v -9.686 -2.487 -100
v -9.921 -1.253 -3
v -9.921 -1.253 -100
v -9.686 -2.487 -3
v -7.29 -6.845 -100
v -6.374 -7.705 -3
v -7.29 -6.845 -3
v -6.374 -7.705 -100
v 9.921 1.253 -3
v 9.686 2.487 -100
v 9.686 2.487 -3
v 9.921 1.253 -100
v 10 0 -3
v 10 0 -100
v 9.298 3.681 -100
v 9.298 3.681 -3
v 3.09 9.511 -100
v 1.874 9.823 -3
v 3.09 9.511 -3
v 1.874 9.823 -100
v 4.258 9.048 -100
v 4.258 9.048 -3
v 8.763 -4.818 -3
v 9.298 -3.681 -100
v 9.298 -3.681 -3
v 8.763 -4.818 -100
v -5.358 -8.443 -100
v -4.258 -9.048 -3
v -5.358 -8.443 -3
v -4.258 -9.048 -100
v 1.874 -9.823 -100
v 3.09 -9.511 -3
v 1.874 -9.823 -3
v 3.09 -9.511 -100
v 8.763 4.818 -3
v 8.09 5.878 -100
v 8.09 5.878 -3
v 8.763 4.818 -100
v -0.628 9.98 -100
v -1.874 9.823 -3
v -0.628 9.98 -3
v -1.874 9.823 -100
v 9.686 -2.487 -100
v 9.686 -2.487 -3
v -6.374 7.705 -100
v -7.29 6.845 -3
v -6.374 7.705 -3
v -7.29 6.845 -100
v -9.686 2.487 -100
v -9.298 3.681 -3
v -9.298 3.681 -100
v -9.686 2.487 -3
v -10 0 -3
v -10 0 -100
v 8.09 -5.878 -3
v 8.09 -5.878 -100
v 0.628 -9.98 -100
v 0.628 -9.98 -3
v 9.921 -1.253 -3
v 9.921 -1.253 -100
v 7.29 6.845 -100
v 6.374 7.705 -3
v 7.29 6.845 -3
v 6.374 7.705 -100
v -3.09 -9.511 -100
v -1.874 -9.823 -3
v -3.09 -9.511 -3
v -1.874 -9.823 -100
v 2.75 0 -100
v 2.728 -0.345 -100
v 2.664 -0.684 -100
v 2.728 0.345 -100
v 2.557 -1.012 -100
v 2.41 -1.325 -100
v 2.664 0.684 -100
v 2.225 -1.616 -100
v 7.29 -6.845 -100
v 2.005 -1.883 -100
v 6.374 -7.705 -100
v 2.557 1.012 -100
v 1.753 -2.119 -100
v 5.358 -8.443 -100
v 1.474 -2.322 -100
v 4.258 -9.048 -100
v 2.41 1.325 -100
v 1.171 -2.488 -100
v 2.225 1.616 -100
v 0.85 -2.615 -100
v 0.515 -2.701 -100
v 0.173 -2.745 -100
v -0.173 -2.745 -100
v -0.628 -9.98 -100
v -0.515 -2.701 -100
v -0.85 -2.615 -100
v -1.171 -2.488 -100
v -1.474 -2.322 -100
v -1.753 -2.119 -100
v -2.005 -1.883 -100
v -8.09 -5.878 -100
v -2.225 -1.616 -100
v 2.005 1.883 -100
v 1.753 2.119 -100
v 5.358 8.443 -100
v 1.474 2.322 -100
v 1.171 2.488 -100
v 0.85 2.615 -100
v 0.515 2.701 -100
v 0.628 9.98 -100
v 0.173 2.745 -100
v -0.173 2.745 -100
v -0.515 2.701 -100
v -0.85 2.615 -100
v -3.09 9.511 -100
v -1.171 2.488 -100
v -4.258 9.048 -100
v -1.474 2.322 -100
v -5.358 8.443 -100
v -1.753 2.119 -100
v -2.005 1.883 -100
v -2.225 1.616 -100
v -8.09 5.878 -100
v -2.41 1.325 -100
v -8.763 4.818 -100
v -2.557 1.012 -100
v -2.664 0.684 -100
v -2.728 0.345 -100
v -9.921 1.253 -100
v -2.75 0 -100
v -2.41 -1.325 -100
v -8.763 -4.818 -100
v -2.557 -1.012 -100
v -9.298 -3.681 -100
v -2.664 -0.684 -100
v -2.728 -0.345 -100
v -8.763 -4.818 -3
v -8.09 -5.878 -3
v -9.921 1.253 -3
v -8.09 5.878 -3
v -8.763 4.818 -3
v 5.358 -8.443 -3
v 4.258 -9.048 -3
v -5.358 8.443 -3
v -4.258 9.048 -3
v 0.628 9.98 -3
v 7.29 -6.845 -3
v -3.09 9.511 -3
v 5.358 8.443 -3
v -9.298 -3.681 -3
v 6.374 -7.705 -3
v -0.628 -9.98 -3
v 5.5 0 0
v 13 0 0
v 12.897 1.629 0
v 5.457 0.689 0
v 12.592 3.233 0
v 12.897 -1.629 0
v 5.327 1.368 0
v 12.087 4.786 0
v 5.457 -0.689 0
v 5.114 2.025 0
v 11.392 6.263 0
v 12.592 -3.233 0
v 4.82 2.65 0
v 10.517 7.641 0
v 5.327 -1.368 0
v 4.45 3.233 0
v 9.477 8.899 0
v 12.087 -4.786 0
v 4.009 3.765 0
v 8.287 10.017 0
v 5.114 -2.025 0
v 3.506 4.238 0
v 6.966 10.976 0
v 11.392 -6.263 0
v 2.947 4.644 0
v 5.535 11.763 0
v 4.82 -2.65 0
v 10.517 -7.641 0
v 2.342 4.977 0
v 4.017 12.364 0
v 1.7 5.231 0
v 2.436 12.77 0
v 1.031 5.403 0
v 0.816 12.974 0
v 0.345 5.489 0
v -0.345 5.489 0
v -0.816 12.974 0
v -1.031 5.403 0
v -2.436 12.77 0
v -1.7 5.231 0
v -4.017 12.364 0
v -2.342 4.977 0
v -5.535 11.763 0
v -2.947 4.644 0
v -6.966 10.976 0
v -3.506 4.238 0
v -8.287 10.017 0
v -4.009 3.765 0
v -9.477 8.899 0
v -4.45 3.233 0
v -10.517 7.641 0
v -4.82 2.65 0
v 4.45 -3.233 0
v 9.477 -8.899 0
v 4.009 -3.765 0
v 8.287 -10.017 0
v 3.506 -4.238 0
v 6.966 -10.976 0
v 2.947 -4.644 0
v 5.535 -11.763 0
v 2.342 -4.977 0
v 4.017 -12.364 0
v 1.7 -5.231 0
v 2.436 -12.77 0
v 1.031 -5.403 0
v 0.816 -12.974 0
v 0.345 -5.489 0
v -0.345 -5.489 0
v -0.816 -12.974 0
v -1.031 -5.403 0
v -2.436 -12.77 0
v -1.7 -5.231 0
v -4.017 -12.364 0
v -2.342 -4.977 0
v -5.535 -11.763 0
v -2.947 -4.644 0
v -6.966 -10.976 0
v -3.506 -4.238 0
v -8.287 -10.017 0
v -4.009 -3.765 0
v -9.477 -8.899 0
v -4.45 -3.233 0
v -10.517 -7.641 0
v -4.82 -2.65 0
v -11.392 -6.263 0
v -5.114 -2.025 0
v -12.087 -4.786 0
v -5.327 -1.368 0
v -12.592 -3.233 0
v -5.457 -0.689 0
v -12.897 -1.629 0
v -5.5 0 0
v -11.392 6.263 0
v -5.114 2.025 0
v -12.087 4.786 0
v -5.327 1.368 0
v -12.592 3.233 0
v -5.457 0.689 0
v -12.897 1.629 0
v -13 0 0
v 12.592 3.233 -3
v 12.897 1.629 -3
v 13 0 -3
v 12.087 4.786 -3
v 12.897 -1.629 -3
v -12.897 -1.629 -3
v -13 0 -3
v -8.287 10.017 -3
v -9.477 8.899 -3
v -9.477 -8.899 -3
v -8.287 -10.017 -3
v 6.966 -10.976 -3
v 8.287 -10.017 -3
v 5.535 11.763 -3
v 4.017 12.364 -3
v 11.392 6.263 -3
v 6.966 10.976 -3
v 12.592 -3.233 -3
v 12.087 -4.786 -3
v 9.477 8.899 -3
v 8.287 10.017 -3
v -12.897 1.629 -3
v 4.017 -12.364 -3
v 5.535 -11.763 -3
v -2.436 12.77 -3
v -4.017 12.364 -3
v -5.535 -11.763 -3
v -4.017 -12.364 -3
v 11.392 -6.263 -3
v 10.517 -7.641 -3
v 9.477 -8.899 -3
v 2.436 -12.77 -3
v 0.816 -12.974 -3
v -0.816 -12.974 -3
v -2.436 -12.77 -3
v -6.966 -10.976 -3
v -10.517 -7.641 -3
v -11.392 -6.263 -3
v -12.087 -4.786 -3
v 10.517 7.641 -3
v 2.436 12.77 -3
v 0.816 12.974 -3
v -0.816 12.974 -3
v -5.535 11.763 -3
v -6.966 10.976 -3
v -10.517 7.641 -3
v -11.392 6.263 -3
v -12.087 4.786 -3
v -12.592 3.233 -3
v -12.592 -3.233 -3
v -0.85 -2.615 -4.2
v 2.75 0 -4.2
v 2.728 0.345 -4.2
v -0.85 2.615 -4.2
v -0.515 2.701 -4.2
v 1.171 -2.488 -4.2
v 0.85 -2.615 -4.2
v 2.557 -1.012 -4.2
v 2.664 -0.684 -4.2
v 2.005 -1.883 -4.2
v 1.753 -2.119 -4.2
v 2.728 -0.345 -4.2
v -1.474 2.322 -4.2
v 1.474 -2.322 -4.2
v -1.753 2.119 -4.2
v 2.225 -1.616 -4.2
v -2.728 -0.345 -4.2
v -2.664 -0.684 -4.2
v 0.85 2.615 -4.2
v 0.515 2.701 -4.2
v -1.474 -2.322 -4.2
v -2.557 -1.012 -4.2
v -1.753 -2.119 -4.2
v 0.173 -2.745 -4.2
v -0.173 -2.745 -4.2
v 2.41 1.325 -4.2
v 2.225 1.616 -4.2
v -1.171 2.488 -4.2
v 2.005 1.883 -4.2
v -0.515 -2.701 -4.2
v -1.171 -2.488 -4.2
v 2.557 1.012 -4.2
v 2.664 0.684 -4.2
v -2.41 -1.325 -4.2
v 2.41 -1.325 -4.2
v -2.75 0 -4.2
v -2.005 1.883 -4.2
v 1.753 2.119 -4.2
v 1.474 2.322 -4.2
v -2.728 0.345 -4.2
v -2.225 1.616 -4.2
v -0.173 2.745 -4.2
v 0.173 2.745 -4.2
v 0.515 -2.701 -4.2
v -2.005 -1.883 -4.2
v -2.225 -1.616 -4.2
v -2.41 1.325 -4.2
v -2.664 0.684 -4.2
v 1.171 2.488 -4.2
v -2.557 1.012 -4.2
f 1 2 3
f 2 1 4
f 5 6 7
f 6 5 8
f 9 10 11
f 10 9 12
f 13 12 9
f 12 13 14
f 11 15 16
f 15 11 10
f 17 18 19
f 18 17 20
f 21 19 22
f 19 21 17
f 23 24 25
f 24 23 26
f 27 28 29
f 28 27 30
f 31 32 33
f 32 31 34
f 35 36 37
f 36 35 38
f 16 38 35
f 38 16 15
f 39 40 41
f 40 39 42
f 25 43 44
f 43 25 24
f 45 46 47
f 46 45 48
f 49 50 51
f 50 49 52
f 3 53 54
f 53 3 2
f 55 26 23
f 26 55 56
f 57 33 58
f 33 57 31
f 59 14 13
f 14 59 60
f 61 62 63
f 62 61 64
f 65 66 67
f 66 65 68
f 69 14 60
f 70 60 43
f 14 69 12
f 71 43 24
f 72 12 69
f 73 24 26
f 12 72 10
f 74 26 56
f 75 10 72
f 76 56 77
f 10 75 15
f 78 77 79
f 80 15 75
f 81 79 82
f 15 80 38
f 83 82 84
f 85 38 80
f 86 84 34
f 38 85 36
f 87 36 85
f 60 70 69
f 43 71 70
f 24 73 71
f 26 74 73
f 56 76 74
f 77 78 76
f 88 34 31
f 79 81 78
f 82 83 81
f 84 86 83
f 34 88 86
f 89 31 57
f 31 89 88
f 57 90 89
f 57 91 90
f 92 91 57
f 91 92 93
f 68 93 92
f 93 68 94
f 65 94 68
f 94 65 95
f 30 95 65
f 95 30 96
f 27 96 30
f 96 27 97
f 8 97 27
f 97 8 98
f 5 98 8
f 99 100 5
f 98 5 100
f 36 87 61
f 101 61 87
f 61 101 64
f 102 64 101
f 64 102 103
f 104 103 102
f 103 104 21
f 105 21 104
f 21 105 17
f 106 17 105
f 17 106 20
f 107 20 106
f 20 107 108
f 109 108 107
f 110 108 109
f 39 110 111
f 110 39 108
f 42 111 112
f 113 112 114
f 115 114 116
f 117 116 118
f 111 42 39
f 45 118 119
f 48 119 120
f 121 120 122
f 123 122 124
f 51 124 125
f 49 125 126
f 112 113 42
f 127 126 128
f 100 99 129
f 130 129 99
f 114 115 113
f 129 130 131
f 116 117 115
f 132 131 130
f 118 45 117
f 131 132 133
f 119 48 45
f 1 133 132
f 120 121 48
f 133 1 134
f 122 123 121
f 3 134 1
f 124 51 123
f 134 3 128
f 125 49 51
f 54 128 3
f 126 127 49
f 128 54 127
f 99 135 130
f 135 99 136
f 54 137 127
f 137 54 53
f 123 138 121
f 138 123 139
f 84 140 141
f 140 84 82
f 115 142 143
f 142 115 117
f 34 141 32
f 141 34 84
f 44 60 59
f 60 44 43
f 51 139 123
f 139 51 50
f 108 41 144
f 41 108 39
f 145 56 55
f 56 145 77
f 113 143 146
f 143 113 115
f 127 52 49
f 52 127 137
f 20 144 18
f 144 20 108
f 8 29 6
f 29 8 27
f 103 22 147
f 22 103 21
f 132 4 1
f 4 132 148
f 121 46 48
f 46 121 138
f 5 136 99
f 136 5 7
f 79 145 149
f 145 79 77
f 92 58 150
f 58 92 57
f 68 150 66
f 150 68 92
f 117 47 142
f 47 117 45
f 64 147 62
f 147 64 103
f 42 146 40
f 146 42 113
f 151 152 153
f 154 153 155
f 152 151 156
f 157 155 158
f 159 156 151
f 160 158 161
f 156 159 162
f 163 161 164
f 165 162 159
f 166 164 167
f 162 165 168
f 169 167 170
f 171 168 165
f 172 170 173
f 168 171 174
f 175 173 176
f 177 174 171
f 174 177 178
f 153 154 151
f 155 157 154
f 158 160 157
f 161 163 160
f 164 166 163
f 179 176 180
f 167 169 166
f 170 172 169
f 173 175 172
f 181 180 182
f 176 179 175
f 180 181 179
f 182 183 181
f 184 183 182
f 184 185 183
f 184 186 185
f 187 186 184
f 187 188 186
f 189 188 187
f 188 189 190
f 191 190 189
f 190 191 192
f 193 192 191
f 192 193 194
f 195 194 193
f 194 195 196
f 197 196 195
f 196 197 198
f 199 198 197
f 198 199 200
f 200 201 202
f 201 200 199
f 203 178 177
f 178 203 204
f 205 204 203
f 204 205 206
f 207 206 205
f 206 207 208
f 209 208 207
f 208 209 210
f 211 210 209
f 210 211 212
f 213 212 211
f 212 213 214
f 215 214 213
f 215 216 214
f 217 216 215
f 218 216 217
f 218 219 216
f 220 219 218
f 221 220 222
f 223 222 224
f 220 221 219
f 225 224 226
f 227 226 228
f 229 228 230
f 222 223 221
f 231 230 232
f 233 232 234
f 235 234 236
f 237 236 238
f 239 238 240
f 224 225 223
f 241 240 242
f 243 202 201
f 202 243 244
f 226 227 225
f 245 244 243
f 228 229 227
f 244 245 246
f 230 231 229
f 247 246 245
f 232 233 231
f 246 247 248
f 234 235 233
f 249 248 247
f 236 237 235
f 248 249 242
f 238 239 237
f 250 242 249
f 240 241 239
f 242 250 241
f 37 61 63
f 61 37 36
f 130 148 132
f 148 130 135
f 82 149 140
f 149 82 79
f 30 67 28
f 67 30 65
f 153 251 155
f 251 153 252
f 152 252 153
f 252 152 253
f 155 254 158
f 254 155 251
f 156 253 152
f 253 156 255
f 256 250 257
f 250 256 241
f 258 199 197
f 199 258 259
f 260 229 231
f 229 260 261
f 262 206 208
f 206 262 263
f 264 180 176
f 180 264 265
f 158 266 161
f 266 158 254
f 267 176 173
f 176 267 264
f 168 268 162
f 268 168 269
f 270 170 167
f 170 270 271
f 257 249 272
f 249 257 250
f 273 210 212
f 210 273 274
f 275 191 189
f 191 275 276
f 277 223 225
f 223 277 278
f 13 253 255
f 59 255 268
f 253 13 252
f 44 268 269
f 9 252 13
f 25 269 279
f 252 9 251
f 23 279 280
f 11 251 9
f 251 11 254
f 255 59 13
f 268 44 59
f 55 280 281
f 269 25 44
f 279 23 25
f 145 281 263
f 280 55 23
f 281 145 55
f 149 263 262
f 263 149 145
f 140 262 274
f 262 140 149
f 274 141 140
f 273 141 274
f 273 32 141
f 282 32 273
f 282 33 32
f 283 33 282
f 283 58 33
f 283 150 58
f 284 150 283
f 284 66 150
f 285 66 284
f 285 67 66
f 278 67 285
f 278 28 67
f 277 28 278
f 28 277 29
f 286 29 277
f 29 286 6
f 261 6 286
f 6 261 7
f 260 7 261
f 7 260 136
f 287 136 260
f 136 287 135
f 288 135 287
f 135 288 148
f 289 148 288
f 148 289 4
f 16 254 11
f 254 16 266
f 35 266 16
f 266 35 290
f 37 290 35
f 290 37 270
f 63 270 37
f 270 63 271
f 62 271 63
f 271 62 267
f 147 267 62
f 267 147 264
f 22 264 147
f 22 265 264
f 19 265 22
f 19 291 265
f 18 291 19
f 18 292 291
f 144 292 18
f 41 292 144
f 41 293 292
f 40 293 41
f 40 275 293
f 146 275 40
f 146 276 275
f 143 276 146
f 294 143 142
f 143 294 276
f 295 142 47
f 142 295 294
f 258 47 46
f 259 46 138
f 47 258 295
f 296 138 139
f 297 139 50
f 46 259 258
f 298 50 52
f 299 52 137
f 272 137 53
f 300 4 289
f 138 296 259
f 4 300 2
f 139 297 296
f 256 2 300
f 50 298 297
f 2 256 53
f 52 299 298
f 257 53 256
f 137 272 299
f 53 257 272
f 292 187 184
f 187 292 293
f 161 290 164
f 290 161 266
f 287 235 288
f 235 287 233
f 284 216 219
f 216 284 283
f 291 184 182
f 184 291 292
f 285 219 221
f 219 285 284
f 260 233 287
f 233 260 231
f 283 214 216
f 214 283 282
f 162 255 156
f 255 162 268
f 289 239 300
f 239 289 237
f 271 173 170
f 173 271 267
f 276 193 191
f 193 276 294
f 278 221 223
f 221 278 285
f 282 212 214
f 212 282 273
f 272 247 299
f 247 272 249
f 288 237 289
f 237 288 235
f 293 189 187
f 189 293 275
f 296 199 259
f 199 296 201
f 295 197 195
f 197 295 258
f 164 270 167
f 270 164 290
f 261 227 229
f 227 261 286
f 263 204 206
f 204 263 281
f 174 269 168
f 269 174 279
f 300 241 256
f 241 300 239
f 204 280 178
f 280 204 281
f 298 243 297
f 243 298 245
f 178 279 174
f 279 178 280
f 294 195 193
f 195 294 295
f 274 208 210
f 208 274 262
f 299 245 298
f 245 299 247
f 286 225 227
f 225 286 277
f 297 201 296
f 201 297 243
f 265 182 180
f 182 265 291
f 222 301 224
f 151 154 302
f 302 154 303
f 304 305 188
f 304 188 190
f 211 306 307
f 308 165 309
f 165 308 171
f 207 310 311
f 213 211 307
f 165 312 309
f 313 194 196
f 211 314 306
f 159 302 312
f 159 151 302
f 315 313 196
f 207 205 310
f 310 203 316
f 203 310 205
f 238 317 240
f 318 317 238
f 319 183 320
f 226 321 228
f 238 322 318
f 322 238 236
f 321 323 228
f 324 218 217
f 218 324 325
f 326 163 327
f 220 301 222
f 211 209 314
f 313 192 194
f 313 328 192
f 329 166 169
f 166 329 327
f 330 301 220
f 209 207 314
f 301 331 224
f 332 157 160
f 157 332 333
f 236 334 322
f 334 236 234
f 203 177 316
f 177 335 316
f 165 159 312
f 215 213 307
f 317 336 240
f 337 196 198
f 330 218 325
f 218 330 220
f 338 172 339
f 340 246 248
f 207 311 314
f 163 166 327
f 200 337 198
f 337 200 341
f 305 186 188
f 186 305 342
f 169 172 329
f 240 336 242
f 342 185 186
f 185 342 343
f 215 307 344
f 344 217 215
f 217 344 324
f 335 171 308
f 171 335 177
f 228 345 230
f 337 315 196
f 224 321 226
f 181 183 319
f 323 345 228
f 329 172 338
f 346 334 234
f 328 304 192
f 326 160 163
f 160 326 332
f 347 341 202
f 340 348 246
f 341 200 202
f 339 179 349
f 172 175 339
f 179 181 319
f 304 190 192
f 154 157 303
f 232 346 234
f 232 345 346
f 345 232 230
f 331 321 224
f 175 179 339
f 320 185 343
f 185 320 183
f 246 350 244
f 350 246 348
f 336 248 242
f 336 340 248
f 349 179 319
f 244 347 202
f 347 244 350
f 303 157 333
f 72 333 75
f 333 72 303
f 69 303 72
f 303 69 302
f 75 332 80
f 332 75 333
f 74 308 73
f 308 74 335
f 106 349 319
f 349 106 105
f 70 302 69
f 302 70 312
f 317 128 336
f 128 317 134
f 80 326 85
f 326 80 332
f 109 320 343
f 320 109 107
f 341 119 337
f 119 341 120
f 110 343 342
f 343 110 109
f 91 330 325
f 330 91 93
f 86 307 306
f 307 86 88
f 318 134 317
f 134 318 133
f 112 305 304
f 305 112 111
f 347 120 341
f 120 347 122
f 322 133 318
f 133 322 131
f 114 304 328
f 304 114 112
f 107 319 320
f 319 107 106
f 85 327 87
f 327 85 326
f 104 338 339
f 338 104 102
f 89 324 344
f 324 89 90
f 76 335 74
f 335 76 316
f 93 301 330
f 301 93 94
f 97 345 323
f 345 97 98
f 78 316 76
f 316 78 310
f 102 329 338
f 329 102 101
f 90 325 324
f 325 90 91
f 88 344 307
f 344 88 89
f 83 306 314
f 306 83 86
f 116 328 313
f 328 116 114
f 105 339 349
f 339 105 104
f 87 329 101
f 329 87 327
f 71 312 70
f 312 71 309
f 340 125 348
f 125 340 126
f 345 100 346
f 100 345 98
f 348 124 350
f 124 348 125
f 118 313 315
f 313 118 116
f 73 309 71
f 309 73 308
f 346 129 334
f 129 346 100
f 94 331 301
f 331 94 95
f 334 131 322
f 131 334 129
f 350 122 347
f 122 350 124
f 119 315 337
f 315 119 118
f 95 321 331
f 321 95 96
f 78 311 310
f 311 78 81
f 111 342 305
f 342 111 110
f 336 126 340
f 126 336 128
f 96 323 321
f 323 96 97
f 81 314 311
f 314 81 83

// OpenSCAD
$fn = 50;


difference() {
	union() {
		translate(v = [0, 0, -100.0000000000]) {
			cylinder(h = 100, r = 10.0000000000);
		}
		translate(v = [0, 0, -3.0000000000]) {
			cylinder(h = 3, r = 13.0000000000);
		}
	}
	union() {
		translate(v = [0, 0, 0]) {
			rotate(a = [0, 0, 0]) {
				difference() {
					union() {
						#translate(v = [0, 0, -100.0000000000]) {
							cylinder(h = 100, r = 2.2500000000);
						}
						#translate(v = [0, 0, -4.2000000000]) {
							cylinder(h = 4.2000000000, r = 10.0000000000, r1 = 2.7500000000, r2 = 5.5000000000);
						}
						#translate(v = [0, 0, -100.0000000000]) {
							cylinder(h = 100, r = 2.7500000000);
						}
						#translate(v = [0, 0, -100.0000000000]) {
							cylinder(h = 100, r = 2.2500000000);
						}
					}
					union();
				}
			}
		}
	}
}
